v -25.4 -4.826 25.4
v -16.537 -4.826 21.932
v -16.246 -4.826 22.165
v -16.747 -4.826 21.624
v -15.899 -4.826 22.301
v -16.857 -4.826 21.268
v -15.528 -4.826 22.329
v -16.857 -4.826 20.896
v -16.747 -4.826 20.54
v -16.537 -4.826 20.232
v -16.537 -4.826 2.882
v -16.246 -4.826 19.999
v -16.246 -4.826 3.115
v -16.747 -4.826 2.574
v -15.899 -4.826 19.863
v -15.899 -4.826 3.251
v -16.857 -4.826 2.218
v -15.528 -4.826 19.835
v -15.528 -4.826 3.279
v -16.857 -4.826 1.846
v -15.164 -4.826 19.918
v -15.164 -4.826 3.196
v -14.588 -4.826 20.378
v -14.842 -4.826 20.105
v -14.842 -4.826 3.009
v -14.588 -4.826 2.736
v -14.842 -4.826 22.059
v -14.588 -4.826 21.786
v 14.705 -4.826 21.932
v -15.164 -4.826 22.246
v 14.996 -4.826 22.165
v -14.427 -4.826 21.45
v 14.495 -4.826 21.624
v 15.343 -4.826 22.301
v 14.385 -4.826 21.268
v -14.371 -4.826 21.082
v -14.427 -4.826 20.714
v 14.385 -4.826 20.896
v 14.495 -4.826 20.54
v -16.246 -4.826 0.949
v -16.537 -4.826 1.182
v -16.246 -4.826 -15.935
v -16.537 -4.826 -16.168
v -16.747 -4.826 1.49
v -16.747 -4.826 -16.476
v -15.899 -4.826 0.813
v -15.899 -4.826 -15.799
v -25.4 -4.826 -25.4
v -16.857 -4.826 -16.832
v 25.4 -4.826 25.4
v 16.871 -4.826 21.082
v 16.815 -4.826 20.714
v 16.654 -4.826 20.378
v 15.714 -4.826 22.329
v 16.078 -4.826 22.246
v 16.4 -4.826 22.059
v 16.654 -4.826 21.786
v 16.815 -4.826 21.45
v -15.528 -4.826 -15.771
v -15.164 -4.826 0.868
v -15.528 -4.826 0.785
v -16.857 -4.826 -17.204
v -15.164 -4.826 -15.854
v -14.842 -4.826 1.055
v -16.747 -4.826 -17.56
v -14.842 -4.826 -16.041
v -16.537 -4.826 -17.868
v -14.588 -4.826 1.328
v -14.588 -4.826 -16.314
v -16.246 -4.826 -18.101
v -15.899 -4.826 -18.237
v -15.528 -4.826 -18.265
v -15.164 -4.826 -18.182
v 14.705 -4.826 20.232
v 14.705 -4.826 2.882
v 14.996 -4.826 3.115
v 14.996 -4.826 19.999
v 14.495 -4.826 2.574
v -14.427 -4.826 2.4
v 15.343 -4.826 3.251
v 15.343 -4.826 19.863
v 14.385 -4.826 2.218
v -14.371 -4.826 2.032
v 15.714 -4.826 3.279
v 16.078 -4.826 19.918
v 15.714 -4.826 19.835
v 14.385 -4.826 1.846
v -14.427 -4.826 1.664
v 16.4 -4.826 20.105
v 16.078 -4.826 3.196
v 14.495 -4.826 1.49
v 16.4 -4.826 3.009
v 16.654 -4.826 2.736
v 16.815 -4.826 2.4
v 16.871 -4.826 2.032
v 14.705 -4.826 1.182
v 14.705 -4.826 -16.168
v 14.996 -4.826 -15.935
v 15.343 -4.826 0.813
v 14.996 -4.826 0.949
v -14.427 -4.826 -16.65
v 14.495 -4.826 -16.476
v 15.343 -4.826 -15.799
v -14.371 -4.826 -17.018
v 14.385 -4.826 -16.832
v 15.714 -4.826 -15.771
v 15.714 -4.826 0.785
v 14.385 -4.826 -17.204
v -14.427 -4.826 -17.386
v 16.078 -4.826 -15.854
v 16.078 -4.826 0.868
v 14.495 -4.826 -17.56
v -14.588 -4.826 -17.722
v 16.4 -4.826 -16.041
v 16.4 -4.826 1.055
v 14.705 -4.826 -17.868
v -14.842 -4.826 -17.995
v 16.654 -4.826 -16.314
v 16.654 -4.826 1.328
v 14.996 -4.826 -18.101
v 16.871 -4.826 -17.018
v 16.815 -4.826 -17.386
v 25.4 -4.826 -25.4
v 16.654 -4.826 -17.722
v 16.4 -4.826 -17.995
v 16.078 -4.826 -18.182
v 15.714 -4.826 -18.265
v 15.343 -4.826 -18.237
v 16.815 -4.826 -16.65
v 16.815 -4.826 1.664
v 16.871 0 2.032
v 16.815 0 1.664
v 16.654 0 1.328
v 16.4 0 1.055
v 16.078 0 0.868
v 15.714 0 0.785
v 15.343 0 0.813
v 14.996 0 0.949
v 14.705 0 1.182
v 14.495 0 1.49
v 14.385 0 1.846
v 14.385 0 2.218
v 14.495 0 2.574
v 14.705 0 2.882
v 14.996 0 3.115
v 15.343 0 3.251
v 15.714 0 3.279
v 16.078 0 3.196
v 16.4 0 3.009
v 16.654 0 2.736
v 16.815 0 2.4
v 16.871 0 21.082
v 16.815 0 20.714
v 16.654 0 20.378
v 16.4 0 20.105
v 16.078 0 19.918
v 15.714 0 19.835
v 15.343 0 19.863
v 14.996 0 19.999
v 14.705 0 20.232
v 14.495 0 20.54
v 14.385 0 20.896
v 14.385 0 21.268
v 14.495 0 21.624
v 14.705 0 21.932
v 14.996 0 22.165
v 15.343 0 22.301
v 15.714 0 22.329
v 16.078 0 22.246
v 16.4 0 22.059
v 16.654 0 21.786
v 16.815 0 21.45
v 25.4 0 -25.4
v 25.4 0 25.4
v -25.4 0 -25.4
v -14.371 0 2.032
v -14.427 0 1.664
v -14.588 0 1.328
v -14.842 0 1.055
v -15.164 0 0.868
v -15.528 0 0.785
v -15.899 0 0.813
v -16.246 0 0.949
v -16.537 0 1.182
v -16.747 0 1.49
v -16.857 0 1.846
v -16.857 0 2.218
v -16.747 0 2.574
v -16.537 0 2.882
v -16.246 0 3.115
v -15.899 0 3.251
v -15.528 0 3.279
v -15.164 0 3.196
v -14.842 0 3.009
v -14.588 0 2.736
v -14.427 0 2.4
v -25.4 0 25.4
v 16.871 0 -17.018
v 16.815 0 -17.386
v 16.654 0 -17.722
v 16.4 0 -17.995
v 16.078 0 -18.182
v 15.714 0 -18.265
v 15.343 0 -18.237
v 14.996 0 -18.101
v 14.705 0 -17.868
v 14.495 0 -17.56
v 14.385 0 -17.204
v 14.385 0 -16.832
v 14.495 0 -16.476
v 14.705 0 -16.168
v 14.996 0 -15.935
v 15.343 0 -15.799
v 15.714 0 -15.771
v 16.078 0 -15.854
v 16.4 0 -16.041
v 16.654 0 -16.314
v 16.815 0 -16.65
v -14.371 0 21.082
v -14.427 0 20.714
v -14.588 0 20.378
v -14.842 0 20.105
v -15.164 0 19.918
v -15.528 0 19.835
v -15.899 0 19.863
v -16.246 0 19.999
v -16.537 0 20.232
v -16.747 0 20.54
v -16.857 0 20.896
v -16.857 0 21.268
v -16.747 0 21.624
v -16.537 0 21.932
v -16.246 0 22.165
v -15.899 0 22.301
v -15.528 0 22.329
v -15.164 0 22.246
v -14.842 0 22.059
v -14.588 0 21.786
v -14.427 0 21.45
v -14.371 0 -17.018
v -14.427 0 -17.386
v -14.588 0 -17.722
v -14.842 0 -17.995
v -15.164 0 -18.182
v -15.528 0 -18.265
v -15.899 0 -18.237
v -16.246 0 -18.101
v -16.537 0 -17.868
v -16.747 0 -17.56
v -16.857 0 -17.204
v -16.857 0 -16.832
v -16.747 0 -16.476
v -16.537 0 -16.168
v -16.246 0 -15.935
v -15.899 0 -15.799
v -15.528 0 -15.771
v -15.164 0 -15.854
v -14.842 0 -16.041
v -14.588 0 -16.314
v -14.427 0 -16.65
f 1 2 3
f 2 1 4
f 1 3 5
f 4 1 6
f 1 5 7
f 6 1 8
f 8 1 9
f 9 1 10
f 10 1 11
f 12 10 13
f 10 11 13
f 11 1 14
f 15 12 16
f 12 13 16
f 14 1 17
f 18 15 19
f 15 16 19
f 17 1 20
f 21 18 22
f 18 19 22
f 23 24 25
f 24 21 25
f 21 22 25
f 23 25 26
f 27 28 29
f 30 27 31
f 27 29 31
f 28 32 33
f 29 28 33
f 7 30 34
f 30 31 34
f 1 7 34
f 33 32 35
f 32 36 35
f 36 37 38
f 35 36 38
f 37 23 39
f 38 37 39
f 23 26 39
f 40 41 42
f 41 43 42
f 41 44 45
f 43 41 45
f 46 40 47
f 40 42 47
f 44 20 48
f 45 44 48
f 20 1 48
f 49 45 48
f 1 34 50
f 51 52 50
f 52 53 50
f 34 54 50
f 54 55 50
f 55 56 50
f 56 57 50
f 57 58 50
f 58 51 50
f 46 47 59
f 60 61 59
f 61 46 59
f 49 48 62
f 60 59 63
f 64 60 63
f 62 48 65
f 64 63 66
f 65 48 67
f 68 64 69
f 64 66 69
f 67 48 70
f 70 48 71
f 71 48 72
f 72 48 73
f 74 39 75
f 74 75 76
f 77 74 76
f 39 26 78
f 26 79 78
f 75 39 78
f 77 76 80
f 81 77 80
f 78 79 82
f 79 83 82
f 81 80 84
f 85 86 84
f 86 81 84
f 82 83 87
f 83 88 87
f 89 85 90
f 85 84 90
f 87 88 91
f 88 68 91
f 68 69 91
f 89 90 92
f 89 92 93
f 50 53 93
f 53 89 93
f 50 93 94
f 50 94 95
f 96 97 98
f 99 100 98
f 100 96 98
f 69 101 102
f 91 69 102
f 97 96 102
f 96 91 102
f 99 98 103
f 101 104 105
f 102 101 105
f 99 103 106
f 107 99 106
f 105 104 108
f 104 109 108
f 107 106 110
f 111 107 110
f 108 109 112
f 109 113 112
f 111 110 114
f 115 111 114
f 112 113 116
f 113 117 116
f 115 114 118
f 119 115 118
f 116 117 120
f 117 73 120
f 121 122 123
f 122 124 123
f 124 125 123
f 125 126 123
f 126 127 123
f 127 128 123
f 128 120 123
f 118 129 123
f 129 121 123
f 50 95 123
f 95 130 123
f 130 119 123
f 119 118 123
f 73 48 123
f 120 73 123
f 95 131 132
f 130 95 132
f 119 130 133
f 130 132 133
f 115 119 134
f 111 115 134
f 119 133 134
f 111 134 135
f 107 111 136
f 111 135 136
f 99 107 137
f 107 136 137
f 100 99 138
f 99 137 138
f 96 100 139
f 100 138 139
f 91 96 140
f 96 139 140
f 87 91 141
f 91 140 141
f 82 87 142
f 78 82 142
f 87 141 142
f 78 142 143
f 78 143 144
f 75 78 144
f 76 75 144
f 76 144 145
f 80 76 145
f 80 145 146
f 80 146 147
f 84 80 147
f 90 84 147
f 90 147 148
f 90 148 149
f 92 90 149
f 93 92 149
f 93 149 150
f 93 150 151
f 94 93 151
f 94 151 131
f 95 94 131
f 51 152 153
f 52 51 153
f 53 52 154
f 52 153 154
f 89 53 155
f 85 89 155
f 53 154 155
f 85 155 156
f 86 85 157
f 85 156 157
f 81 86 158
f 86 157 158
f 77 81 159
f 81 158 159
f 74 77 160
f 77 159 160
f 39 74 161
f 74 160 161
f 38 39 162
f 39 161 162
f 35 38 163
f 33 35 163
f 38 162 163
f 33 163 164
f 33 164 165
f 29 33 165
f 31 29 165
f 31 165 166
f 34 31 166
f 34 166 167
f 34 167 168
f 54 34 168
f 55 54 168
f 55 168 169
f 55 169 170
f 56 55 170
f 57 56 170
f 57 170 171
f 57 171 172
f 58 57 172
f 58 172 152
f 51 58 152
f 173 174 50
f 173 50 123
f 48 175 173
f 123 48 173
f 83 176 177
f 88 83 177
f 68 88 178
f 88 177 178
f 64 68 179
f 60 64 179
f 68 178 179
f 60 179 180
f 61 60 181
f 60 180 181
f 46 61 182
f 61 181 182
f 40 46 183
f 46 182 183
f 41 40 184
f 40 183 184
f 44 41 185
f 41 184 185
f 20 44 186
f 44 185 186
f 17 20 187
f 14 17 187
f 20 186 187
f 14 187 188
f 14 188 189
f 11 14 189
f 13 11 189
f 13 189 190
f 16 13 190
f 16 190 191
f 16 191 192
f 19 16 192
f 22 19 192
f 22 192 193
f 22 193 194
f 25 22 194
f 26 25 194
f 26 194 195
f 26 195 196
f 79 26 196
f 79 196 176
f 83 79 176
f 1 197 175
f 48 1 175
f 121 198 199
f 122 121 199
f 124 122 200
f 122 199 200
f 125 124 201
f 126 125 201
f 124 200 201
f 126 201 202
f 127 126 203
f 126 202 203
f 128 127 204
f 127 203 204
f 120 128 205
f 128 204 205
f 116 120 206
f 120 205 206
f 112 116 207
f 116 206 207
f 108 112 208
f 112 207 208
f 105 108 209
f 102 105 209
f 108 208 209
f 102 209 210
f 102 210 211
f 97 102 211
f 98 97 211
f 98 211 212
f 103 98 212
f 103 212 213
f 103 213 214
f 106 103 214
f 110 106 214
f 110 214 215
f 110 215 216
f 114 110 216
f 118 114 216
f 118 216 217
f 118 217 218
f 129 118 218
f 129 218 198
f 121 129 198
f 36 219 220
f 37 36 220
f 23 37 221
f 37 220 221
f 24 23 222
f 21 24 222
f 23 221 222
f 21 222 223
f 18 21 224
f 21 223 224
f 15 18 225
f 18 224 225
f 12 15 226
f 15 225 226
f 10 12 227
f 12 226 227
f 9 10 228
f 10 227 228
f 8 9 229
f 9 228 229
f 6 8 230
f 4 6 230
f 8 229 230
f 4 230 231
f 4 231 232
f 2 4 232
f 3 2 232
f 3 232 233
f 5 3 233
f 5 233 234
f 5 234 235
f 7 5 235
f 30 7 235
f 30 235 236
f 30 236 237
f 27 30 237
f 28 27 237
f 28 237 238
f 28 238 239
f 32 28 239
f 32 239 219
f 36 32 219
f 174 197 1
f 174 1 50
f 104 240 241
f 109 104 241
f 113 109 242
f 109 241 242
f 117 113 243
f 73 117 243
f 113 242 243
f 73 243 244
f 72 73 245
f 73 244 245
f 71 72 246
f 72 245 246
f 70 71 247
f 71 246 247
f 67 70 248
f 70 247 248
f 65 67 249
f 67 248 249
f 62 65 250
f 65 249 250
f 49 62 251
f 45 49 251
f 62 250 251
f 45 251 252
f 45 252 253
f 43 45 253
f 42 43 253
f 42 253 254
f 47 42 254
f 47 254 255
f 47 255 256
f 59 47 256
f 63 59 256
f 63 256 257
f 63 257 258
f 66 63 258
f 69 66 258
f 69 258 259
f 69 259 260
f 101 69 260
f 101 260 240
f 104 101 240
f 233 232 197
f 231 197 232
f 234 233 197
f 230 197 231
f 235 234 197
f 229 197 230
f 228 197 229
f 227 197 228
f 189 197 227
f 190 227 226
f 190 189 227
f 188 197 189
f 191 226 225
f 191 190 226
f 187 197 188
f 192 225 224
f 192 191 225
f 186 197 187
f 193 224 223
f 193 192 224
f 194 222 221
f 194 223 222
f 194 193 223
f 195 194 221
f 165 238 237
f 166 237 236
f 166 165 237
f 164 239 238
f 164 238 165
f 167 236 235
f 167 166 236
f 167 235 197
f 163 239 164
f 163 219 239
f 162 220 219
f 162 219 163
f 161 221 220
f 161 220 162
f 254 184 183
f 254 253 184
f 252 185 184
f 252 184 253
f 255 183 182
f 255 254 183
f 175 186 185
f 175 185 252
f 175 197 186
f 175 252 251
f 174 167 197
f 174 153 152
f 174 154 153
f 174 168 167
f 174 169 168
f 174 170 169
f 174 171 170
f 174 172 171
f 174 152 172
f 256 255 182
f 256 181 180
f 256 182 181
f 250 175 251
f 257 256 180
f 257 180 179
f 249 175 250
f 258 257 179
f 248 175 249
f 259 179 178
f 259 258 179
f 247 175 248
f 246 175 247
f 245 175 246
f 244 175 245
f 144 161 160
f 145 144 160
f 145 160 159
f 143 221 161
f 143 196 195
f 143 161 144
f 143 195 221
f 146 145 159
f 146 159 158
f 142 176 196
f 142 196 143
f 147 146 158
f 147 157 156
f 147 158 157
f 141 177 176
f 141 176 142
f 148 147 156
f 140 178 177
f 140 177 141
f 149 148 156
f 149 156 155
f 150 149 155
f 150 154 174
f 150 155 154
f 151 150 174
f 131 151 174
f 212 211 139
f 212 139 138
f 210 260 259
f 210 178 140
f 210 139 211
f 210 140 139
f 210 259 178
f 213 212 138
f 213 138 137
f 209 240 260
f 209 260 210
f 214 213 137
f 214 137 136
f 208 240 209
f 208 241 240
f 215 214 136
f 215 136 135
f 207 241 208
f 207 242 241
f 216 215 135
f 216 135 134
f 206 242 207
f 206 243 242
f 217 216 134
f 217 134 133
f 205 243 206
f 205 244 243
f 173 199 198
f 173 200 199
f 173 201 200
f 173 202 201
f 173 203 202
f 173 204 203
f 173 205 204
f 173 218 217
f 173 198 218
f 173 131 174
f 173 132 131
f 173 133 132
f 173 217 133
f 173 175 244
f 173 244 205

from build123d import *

# Parameters (mm, degrees)
SKETCH1_W           = 50.8
SKETCH1_H           = 50.8
BOSS_EXTRUDE1_DEPTH = 4.826
SKETCH2_R           = 1.25
CUT_EXTRUDE1_DEPTH  = 9.906
LPATTERN1_COUNT     = 3
LPATTERN1_PITCH     = 19.05


with BuildPart() as part:
    # Sketch1 → Boss-Extrude1 (new body)
    with BuildSketch(Plane(origin=(0, 0, 0), x_dir=(1, 0, 0), z_dir=(0, 1, 0))):
        Rectangle(SKETCH1_W, SKETCH1_H)
    extrude(amount=-BOSS_EXTRUDE1_DEPTH)

    # Sketch2 → Cut-Extrude1 (cut)
    with BuildSketch(Plane(origin=(0, 0, 0), x_dir=(1, 0, 0), z_dir=(0, 1, 0))):
        with Locations((-15.621, 17.018)):
            Circle(SKETCH2_R)
        with Locations((15.621, 17.018)):
            Circle(SKETCH2_R)
    cut_extrude1 = extrude(amount=-CUT_EXTRUDE1_DEPTH, mode=Mode.SUBTRACT)

    # LPattern1: Cut-Extrude1 ×3
    with Locations(*[(0, 0, i * LPATTERN1_PITCH) for i in range(1, LPATTERN1_COUNT)]):
        add(cut_extrude1, mode=Mode.SUBTRACT)


solid = part.part
